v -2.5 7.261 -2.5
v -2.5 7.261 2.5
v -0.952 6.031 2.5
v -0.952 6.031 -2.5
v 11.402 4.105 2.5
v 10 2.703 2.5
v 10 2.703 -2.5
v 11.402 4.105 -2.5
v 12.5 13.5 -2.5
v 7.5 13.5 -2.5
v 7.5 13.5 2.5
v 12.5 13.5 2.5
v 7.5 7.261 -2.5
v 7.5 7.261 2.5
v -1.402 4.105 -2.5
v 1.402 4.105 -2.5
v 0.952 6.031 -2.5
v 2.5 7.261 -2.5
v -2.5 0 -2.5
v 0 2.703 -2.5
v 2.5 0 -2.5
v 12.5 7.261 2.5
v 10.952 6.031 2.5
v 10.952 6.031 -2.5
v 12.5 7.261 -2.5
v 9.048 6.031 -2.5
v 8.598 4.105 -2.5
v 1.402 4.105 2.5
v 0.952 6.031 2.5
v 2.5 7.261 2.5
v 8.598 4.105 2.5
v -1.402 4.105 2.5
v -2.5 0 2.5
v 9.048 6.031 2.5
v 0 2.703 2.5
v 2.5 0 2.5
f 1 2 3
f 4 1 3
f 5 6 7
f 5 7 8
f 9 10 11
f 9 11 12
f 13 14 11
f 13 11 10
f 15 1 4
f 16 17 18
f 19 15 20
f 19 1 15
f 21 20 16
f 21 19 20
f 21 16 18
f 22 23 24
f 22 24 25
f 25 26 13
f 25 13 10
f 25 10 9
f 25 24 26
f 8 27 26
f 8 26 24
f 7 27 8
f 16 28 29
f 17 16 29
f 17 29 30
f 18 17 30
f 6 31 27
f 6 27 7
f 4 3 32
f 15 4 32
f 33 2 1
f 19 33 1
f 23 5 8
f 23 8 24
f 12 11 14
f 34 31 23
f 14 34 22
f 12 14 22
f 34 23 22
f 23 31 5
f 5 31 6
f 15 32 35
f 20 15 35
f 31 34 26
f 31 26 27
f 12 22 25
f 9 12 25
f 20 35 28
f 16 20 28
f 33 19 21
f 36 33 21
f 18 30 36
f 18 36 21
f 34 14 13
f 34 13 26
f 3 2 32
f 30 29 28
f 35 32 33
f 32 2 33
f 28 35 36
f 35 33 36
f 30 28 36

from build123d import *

# Parameters (mm, degrees)
SKETCH2_W           = 5
SKETCH2_H           = 5
BOSS_EXTRUDE1_DEPTH = 13.5
SKETCH4_W           = 5
SKETCH4_H           = 5
BOSS_EXTRUDE2_DEPTH = 13.5
CUT_EXTRUDE1_DEPTH  = 13.5


with BuildPart() as part:
    # Sketch2 → Boss-Extrude1 (new body)
    with BuildSketch(Plane(origin=(0, 0, 0), x_dir=(1, 0, 0), z_dir=(0, 1, 0))):
        Rectangle(SKETCH2_W, SKETCH2_H)
    extrude(amount=BOSS_EXTRUDE1_DEPTH)


with BuildPart() as body_2:
    # Sketch4 → Boss-Extrude2 (new body)
    with BuildSketch(Plane(origin=(0, 0, 0), x_dir=(1, 0, 0), z_dir=(0, 1, 0))):
        with Locations((10, 0)):
            Rectangle(SKETCH4_W, SKETCH4_H)
    extrude(amount=BOSS_EXTRUDE2_DEPTH)


with BuildPart() as cut_extrude1_tool:
    # Sketch5 → Cut-Extrude1 (new body)
    with BuildSketch(Plane.XY.offset(2.5)):
        Polygon((-2.5, 7.260869403), (-0.951527857, 6.031426965), (-1.402323417, 4.105300481), (0, 2.702977063), (1.402323417, 4.105300481), (0.951527857, 6.031426965), (2.5, 7.260869403), (2.5, 13.5), (-2.5, 13.5), align=None)
        Polygon((7.5, 7.260869403), (9.048472143, 6.031426965), (8.597676583, 4.105300481), (10, 2.702977063), (11.402323417, 4.105300481), (10.951527857, 6.031426965), (12.5, 7.260869403), (12.5, 0), (7.5, 0), align=None)
    extrude(amount=-CUT_EXTRUDE1_DEPTH)


with BuildPart() as part_1:
    add(part.part)

    # Cut-Extrude1: cut by cut_extrude1_tool
    add(cut_extrude1_tool.part, mode=Mode.SUBTRACT)


with BuildPart() as body_2_1:
    add(body_2.part)

    # Cut-Extrude1: cut by cut_extrude1_tool
    add(cut_extrude1_tool.part, mode=Mode.SUBTRACT)


solid = Compound([part_1.part, body_2_1.part])
